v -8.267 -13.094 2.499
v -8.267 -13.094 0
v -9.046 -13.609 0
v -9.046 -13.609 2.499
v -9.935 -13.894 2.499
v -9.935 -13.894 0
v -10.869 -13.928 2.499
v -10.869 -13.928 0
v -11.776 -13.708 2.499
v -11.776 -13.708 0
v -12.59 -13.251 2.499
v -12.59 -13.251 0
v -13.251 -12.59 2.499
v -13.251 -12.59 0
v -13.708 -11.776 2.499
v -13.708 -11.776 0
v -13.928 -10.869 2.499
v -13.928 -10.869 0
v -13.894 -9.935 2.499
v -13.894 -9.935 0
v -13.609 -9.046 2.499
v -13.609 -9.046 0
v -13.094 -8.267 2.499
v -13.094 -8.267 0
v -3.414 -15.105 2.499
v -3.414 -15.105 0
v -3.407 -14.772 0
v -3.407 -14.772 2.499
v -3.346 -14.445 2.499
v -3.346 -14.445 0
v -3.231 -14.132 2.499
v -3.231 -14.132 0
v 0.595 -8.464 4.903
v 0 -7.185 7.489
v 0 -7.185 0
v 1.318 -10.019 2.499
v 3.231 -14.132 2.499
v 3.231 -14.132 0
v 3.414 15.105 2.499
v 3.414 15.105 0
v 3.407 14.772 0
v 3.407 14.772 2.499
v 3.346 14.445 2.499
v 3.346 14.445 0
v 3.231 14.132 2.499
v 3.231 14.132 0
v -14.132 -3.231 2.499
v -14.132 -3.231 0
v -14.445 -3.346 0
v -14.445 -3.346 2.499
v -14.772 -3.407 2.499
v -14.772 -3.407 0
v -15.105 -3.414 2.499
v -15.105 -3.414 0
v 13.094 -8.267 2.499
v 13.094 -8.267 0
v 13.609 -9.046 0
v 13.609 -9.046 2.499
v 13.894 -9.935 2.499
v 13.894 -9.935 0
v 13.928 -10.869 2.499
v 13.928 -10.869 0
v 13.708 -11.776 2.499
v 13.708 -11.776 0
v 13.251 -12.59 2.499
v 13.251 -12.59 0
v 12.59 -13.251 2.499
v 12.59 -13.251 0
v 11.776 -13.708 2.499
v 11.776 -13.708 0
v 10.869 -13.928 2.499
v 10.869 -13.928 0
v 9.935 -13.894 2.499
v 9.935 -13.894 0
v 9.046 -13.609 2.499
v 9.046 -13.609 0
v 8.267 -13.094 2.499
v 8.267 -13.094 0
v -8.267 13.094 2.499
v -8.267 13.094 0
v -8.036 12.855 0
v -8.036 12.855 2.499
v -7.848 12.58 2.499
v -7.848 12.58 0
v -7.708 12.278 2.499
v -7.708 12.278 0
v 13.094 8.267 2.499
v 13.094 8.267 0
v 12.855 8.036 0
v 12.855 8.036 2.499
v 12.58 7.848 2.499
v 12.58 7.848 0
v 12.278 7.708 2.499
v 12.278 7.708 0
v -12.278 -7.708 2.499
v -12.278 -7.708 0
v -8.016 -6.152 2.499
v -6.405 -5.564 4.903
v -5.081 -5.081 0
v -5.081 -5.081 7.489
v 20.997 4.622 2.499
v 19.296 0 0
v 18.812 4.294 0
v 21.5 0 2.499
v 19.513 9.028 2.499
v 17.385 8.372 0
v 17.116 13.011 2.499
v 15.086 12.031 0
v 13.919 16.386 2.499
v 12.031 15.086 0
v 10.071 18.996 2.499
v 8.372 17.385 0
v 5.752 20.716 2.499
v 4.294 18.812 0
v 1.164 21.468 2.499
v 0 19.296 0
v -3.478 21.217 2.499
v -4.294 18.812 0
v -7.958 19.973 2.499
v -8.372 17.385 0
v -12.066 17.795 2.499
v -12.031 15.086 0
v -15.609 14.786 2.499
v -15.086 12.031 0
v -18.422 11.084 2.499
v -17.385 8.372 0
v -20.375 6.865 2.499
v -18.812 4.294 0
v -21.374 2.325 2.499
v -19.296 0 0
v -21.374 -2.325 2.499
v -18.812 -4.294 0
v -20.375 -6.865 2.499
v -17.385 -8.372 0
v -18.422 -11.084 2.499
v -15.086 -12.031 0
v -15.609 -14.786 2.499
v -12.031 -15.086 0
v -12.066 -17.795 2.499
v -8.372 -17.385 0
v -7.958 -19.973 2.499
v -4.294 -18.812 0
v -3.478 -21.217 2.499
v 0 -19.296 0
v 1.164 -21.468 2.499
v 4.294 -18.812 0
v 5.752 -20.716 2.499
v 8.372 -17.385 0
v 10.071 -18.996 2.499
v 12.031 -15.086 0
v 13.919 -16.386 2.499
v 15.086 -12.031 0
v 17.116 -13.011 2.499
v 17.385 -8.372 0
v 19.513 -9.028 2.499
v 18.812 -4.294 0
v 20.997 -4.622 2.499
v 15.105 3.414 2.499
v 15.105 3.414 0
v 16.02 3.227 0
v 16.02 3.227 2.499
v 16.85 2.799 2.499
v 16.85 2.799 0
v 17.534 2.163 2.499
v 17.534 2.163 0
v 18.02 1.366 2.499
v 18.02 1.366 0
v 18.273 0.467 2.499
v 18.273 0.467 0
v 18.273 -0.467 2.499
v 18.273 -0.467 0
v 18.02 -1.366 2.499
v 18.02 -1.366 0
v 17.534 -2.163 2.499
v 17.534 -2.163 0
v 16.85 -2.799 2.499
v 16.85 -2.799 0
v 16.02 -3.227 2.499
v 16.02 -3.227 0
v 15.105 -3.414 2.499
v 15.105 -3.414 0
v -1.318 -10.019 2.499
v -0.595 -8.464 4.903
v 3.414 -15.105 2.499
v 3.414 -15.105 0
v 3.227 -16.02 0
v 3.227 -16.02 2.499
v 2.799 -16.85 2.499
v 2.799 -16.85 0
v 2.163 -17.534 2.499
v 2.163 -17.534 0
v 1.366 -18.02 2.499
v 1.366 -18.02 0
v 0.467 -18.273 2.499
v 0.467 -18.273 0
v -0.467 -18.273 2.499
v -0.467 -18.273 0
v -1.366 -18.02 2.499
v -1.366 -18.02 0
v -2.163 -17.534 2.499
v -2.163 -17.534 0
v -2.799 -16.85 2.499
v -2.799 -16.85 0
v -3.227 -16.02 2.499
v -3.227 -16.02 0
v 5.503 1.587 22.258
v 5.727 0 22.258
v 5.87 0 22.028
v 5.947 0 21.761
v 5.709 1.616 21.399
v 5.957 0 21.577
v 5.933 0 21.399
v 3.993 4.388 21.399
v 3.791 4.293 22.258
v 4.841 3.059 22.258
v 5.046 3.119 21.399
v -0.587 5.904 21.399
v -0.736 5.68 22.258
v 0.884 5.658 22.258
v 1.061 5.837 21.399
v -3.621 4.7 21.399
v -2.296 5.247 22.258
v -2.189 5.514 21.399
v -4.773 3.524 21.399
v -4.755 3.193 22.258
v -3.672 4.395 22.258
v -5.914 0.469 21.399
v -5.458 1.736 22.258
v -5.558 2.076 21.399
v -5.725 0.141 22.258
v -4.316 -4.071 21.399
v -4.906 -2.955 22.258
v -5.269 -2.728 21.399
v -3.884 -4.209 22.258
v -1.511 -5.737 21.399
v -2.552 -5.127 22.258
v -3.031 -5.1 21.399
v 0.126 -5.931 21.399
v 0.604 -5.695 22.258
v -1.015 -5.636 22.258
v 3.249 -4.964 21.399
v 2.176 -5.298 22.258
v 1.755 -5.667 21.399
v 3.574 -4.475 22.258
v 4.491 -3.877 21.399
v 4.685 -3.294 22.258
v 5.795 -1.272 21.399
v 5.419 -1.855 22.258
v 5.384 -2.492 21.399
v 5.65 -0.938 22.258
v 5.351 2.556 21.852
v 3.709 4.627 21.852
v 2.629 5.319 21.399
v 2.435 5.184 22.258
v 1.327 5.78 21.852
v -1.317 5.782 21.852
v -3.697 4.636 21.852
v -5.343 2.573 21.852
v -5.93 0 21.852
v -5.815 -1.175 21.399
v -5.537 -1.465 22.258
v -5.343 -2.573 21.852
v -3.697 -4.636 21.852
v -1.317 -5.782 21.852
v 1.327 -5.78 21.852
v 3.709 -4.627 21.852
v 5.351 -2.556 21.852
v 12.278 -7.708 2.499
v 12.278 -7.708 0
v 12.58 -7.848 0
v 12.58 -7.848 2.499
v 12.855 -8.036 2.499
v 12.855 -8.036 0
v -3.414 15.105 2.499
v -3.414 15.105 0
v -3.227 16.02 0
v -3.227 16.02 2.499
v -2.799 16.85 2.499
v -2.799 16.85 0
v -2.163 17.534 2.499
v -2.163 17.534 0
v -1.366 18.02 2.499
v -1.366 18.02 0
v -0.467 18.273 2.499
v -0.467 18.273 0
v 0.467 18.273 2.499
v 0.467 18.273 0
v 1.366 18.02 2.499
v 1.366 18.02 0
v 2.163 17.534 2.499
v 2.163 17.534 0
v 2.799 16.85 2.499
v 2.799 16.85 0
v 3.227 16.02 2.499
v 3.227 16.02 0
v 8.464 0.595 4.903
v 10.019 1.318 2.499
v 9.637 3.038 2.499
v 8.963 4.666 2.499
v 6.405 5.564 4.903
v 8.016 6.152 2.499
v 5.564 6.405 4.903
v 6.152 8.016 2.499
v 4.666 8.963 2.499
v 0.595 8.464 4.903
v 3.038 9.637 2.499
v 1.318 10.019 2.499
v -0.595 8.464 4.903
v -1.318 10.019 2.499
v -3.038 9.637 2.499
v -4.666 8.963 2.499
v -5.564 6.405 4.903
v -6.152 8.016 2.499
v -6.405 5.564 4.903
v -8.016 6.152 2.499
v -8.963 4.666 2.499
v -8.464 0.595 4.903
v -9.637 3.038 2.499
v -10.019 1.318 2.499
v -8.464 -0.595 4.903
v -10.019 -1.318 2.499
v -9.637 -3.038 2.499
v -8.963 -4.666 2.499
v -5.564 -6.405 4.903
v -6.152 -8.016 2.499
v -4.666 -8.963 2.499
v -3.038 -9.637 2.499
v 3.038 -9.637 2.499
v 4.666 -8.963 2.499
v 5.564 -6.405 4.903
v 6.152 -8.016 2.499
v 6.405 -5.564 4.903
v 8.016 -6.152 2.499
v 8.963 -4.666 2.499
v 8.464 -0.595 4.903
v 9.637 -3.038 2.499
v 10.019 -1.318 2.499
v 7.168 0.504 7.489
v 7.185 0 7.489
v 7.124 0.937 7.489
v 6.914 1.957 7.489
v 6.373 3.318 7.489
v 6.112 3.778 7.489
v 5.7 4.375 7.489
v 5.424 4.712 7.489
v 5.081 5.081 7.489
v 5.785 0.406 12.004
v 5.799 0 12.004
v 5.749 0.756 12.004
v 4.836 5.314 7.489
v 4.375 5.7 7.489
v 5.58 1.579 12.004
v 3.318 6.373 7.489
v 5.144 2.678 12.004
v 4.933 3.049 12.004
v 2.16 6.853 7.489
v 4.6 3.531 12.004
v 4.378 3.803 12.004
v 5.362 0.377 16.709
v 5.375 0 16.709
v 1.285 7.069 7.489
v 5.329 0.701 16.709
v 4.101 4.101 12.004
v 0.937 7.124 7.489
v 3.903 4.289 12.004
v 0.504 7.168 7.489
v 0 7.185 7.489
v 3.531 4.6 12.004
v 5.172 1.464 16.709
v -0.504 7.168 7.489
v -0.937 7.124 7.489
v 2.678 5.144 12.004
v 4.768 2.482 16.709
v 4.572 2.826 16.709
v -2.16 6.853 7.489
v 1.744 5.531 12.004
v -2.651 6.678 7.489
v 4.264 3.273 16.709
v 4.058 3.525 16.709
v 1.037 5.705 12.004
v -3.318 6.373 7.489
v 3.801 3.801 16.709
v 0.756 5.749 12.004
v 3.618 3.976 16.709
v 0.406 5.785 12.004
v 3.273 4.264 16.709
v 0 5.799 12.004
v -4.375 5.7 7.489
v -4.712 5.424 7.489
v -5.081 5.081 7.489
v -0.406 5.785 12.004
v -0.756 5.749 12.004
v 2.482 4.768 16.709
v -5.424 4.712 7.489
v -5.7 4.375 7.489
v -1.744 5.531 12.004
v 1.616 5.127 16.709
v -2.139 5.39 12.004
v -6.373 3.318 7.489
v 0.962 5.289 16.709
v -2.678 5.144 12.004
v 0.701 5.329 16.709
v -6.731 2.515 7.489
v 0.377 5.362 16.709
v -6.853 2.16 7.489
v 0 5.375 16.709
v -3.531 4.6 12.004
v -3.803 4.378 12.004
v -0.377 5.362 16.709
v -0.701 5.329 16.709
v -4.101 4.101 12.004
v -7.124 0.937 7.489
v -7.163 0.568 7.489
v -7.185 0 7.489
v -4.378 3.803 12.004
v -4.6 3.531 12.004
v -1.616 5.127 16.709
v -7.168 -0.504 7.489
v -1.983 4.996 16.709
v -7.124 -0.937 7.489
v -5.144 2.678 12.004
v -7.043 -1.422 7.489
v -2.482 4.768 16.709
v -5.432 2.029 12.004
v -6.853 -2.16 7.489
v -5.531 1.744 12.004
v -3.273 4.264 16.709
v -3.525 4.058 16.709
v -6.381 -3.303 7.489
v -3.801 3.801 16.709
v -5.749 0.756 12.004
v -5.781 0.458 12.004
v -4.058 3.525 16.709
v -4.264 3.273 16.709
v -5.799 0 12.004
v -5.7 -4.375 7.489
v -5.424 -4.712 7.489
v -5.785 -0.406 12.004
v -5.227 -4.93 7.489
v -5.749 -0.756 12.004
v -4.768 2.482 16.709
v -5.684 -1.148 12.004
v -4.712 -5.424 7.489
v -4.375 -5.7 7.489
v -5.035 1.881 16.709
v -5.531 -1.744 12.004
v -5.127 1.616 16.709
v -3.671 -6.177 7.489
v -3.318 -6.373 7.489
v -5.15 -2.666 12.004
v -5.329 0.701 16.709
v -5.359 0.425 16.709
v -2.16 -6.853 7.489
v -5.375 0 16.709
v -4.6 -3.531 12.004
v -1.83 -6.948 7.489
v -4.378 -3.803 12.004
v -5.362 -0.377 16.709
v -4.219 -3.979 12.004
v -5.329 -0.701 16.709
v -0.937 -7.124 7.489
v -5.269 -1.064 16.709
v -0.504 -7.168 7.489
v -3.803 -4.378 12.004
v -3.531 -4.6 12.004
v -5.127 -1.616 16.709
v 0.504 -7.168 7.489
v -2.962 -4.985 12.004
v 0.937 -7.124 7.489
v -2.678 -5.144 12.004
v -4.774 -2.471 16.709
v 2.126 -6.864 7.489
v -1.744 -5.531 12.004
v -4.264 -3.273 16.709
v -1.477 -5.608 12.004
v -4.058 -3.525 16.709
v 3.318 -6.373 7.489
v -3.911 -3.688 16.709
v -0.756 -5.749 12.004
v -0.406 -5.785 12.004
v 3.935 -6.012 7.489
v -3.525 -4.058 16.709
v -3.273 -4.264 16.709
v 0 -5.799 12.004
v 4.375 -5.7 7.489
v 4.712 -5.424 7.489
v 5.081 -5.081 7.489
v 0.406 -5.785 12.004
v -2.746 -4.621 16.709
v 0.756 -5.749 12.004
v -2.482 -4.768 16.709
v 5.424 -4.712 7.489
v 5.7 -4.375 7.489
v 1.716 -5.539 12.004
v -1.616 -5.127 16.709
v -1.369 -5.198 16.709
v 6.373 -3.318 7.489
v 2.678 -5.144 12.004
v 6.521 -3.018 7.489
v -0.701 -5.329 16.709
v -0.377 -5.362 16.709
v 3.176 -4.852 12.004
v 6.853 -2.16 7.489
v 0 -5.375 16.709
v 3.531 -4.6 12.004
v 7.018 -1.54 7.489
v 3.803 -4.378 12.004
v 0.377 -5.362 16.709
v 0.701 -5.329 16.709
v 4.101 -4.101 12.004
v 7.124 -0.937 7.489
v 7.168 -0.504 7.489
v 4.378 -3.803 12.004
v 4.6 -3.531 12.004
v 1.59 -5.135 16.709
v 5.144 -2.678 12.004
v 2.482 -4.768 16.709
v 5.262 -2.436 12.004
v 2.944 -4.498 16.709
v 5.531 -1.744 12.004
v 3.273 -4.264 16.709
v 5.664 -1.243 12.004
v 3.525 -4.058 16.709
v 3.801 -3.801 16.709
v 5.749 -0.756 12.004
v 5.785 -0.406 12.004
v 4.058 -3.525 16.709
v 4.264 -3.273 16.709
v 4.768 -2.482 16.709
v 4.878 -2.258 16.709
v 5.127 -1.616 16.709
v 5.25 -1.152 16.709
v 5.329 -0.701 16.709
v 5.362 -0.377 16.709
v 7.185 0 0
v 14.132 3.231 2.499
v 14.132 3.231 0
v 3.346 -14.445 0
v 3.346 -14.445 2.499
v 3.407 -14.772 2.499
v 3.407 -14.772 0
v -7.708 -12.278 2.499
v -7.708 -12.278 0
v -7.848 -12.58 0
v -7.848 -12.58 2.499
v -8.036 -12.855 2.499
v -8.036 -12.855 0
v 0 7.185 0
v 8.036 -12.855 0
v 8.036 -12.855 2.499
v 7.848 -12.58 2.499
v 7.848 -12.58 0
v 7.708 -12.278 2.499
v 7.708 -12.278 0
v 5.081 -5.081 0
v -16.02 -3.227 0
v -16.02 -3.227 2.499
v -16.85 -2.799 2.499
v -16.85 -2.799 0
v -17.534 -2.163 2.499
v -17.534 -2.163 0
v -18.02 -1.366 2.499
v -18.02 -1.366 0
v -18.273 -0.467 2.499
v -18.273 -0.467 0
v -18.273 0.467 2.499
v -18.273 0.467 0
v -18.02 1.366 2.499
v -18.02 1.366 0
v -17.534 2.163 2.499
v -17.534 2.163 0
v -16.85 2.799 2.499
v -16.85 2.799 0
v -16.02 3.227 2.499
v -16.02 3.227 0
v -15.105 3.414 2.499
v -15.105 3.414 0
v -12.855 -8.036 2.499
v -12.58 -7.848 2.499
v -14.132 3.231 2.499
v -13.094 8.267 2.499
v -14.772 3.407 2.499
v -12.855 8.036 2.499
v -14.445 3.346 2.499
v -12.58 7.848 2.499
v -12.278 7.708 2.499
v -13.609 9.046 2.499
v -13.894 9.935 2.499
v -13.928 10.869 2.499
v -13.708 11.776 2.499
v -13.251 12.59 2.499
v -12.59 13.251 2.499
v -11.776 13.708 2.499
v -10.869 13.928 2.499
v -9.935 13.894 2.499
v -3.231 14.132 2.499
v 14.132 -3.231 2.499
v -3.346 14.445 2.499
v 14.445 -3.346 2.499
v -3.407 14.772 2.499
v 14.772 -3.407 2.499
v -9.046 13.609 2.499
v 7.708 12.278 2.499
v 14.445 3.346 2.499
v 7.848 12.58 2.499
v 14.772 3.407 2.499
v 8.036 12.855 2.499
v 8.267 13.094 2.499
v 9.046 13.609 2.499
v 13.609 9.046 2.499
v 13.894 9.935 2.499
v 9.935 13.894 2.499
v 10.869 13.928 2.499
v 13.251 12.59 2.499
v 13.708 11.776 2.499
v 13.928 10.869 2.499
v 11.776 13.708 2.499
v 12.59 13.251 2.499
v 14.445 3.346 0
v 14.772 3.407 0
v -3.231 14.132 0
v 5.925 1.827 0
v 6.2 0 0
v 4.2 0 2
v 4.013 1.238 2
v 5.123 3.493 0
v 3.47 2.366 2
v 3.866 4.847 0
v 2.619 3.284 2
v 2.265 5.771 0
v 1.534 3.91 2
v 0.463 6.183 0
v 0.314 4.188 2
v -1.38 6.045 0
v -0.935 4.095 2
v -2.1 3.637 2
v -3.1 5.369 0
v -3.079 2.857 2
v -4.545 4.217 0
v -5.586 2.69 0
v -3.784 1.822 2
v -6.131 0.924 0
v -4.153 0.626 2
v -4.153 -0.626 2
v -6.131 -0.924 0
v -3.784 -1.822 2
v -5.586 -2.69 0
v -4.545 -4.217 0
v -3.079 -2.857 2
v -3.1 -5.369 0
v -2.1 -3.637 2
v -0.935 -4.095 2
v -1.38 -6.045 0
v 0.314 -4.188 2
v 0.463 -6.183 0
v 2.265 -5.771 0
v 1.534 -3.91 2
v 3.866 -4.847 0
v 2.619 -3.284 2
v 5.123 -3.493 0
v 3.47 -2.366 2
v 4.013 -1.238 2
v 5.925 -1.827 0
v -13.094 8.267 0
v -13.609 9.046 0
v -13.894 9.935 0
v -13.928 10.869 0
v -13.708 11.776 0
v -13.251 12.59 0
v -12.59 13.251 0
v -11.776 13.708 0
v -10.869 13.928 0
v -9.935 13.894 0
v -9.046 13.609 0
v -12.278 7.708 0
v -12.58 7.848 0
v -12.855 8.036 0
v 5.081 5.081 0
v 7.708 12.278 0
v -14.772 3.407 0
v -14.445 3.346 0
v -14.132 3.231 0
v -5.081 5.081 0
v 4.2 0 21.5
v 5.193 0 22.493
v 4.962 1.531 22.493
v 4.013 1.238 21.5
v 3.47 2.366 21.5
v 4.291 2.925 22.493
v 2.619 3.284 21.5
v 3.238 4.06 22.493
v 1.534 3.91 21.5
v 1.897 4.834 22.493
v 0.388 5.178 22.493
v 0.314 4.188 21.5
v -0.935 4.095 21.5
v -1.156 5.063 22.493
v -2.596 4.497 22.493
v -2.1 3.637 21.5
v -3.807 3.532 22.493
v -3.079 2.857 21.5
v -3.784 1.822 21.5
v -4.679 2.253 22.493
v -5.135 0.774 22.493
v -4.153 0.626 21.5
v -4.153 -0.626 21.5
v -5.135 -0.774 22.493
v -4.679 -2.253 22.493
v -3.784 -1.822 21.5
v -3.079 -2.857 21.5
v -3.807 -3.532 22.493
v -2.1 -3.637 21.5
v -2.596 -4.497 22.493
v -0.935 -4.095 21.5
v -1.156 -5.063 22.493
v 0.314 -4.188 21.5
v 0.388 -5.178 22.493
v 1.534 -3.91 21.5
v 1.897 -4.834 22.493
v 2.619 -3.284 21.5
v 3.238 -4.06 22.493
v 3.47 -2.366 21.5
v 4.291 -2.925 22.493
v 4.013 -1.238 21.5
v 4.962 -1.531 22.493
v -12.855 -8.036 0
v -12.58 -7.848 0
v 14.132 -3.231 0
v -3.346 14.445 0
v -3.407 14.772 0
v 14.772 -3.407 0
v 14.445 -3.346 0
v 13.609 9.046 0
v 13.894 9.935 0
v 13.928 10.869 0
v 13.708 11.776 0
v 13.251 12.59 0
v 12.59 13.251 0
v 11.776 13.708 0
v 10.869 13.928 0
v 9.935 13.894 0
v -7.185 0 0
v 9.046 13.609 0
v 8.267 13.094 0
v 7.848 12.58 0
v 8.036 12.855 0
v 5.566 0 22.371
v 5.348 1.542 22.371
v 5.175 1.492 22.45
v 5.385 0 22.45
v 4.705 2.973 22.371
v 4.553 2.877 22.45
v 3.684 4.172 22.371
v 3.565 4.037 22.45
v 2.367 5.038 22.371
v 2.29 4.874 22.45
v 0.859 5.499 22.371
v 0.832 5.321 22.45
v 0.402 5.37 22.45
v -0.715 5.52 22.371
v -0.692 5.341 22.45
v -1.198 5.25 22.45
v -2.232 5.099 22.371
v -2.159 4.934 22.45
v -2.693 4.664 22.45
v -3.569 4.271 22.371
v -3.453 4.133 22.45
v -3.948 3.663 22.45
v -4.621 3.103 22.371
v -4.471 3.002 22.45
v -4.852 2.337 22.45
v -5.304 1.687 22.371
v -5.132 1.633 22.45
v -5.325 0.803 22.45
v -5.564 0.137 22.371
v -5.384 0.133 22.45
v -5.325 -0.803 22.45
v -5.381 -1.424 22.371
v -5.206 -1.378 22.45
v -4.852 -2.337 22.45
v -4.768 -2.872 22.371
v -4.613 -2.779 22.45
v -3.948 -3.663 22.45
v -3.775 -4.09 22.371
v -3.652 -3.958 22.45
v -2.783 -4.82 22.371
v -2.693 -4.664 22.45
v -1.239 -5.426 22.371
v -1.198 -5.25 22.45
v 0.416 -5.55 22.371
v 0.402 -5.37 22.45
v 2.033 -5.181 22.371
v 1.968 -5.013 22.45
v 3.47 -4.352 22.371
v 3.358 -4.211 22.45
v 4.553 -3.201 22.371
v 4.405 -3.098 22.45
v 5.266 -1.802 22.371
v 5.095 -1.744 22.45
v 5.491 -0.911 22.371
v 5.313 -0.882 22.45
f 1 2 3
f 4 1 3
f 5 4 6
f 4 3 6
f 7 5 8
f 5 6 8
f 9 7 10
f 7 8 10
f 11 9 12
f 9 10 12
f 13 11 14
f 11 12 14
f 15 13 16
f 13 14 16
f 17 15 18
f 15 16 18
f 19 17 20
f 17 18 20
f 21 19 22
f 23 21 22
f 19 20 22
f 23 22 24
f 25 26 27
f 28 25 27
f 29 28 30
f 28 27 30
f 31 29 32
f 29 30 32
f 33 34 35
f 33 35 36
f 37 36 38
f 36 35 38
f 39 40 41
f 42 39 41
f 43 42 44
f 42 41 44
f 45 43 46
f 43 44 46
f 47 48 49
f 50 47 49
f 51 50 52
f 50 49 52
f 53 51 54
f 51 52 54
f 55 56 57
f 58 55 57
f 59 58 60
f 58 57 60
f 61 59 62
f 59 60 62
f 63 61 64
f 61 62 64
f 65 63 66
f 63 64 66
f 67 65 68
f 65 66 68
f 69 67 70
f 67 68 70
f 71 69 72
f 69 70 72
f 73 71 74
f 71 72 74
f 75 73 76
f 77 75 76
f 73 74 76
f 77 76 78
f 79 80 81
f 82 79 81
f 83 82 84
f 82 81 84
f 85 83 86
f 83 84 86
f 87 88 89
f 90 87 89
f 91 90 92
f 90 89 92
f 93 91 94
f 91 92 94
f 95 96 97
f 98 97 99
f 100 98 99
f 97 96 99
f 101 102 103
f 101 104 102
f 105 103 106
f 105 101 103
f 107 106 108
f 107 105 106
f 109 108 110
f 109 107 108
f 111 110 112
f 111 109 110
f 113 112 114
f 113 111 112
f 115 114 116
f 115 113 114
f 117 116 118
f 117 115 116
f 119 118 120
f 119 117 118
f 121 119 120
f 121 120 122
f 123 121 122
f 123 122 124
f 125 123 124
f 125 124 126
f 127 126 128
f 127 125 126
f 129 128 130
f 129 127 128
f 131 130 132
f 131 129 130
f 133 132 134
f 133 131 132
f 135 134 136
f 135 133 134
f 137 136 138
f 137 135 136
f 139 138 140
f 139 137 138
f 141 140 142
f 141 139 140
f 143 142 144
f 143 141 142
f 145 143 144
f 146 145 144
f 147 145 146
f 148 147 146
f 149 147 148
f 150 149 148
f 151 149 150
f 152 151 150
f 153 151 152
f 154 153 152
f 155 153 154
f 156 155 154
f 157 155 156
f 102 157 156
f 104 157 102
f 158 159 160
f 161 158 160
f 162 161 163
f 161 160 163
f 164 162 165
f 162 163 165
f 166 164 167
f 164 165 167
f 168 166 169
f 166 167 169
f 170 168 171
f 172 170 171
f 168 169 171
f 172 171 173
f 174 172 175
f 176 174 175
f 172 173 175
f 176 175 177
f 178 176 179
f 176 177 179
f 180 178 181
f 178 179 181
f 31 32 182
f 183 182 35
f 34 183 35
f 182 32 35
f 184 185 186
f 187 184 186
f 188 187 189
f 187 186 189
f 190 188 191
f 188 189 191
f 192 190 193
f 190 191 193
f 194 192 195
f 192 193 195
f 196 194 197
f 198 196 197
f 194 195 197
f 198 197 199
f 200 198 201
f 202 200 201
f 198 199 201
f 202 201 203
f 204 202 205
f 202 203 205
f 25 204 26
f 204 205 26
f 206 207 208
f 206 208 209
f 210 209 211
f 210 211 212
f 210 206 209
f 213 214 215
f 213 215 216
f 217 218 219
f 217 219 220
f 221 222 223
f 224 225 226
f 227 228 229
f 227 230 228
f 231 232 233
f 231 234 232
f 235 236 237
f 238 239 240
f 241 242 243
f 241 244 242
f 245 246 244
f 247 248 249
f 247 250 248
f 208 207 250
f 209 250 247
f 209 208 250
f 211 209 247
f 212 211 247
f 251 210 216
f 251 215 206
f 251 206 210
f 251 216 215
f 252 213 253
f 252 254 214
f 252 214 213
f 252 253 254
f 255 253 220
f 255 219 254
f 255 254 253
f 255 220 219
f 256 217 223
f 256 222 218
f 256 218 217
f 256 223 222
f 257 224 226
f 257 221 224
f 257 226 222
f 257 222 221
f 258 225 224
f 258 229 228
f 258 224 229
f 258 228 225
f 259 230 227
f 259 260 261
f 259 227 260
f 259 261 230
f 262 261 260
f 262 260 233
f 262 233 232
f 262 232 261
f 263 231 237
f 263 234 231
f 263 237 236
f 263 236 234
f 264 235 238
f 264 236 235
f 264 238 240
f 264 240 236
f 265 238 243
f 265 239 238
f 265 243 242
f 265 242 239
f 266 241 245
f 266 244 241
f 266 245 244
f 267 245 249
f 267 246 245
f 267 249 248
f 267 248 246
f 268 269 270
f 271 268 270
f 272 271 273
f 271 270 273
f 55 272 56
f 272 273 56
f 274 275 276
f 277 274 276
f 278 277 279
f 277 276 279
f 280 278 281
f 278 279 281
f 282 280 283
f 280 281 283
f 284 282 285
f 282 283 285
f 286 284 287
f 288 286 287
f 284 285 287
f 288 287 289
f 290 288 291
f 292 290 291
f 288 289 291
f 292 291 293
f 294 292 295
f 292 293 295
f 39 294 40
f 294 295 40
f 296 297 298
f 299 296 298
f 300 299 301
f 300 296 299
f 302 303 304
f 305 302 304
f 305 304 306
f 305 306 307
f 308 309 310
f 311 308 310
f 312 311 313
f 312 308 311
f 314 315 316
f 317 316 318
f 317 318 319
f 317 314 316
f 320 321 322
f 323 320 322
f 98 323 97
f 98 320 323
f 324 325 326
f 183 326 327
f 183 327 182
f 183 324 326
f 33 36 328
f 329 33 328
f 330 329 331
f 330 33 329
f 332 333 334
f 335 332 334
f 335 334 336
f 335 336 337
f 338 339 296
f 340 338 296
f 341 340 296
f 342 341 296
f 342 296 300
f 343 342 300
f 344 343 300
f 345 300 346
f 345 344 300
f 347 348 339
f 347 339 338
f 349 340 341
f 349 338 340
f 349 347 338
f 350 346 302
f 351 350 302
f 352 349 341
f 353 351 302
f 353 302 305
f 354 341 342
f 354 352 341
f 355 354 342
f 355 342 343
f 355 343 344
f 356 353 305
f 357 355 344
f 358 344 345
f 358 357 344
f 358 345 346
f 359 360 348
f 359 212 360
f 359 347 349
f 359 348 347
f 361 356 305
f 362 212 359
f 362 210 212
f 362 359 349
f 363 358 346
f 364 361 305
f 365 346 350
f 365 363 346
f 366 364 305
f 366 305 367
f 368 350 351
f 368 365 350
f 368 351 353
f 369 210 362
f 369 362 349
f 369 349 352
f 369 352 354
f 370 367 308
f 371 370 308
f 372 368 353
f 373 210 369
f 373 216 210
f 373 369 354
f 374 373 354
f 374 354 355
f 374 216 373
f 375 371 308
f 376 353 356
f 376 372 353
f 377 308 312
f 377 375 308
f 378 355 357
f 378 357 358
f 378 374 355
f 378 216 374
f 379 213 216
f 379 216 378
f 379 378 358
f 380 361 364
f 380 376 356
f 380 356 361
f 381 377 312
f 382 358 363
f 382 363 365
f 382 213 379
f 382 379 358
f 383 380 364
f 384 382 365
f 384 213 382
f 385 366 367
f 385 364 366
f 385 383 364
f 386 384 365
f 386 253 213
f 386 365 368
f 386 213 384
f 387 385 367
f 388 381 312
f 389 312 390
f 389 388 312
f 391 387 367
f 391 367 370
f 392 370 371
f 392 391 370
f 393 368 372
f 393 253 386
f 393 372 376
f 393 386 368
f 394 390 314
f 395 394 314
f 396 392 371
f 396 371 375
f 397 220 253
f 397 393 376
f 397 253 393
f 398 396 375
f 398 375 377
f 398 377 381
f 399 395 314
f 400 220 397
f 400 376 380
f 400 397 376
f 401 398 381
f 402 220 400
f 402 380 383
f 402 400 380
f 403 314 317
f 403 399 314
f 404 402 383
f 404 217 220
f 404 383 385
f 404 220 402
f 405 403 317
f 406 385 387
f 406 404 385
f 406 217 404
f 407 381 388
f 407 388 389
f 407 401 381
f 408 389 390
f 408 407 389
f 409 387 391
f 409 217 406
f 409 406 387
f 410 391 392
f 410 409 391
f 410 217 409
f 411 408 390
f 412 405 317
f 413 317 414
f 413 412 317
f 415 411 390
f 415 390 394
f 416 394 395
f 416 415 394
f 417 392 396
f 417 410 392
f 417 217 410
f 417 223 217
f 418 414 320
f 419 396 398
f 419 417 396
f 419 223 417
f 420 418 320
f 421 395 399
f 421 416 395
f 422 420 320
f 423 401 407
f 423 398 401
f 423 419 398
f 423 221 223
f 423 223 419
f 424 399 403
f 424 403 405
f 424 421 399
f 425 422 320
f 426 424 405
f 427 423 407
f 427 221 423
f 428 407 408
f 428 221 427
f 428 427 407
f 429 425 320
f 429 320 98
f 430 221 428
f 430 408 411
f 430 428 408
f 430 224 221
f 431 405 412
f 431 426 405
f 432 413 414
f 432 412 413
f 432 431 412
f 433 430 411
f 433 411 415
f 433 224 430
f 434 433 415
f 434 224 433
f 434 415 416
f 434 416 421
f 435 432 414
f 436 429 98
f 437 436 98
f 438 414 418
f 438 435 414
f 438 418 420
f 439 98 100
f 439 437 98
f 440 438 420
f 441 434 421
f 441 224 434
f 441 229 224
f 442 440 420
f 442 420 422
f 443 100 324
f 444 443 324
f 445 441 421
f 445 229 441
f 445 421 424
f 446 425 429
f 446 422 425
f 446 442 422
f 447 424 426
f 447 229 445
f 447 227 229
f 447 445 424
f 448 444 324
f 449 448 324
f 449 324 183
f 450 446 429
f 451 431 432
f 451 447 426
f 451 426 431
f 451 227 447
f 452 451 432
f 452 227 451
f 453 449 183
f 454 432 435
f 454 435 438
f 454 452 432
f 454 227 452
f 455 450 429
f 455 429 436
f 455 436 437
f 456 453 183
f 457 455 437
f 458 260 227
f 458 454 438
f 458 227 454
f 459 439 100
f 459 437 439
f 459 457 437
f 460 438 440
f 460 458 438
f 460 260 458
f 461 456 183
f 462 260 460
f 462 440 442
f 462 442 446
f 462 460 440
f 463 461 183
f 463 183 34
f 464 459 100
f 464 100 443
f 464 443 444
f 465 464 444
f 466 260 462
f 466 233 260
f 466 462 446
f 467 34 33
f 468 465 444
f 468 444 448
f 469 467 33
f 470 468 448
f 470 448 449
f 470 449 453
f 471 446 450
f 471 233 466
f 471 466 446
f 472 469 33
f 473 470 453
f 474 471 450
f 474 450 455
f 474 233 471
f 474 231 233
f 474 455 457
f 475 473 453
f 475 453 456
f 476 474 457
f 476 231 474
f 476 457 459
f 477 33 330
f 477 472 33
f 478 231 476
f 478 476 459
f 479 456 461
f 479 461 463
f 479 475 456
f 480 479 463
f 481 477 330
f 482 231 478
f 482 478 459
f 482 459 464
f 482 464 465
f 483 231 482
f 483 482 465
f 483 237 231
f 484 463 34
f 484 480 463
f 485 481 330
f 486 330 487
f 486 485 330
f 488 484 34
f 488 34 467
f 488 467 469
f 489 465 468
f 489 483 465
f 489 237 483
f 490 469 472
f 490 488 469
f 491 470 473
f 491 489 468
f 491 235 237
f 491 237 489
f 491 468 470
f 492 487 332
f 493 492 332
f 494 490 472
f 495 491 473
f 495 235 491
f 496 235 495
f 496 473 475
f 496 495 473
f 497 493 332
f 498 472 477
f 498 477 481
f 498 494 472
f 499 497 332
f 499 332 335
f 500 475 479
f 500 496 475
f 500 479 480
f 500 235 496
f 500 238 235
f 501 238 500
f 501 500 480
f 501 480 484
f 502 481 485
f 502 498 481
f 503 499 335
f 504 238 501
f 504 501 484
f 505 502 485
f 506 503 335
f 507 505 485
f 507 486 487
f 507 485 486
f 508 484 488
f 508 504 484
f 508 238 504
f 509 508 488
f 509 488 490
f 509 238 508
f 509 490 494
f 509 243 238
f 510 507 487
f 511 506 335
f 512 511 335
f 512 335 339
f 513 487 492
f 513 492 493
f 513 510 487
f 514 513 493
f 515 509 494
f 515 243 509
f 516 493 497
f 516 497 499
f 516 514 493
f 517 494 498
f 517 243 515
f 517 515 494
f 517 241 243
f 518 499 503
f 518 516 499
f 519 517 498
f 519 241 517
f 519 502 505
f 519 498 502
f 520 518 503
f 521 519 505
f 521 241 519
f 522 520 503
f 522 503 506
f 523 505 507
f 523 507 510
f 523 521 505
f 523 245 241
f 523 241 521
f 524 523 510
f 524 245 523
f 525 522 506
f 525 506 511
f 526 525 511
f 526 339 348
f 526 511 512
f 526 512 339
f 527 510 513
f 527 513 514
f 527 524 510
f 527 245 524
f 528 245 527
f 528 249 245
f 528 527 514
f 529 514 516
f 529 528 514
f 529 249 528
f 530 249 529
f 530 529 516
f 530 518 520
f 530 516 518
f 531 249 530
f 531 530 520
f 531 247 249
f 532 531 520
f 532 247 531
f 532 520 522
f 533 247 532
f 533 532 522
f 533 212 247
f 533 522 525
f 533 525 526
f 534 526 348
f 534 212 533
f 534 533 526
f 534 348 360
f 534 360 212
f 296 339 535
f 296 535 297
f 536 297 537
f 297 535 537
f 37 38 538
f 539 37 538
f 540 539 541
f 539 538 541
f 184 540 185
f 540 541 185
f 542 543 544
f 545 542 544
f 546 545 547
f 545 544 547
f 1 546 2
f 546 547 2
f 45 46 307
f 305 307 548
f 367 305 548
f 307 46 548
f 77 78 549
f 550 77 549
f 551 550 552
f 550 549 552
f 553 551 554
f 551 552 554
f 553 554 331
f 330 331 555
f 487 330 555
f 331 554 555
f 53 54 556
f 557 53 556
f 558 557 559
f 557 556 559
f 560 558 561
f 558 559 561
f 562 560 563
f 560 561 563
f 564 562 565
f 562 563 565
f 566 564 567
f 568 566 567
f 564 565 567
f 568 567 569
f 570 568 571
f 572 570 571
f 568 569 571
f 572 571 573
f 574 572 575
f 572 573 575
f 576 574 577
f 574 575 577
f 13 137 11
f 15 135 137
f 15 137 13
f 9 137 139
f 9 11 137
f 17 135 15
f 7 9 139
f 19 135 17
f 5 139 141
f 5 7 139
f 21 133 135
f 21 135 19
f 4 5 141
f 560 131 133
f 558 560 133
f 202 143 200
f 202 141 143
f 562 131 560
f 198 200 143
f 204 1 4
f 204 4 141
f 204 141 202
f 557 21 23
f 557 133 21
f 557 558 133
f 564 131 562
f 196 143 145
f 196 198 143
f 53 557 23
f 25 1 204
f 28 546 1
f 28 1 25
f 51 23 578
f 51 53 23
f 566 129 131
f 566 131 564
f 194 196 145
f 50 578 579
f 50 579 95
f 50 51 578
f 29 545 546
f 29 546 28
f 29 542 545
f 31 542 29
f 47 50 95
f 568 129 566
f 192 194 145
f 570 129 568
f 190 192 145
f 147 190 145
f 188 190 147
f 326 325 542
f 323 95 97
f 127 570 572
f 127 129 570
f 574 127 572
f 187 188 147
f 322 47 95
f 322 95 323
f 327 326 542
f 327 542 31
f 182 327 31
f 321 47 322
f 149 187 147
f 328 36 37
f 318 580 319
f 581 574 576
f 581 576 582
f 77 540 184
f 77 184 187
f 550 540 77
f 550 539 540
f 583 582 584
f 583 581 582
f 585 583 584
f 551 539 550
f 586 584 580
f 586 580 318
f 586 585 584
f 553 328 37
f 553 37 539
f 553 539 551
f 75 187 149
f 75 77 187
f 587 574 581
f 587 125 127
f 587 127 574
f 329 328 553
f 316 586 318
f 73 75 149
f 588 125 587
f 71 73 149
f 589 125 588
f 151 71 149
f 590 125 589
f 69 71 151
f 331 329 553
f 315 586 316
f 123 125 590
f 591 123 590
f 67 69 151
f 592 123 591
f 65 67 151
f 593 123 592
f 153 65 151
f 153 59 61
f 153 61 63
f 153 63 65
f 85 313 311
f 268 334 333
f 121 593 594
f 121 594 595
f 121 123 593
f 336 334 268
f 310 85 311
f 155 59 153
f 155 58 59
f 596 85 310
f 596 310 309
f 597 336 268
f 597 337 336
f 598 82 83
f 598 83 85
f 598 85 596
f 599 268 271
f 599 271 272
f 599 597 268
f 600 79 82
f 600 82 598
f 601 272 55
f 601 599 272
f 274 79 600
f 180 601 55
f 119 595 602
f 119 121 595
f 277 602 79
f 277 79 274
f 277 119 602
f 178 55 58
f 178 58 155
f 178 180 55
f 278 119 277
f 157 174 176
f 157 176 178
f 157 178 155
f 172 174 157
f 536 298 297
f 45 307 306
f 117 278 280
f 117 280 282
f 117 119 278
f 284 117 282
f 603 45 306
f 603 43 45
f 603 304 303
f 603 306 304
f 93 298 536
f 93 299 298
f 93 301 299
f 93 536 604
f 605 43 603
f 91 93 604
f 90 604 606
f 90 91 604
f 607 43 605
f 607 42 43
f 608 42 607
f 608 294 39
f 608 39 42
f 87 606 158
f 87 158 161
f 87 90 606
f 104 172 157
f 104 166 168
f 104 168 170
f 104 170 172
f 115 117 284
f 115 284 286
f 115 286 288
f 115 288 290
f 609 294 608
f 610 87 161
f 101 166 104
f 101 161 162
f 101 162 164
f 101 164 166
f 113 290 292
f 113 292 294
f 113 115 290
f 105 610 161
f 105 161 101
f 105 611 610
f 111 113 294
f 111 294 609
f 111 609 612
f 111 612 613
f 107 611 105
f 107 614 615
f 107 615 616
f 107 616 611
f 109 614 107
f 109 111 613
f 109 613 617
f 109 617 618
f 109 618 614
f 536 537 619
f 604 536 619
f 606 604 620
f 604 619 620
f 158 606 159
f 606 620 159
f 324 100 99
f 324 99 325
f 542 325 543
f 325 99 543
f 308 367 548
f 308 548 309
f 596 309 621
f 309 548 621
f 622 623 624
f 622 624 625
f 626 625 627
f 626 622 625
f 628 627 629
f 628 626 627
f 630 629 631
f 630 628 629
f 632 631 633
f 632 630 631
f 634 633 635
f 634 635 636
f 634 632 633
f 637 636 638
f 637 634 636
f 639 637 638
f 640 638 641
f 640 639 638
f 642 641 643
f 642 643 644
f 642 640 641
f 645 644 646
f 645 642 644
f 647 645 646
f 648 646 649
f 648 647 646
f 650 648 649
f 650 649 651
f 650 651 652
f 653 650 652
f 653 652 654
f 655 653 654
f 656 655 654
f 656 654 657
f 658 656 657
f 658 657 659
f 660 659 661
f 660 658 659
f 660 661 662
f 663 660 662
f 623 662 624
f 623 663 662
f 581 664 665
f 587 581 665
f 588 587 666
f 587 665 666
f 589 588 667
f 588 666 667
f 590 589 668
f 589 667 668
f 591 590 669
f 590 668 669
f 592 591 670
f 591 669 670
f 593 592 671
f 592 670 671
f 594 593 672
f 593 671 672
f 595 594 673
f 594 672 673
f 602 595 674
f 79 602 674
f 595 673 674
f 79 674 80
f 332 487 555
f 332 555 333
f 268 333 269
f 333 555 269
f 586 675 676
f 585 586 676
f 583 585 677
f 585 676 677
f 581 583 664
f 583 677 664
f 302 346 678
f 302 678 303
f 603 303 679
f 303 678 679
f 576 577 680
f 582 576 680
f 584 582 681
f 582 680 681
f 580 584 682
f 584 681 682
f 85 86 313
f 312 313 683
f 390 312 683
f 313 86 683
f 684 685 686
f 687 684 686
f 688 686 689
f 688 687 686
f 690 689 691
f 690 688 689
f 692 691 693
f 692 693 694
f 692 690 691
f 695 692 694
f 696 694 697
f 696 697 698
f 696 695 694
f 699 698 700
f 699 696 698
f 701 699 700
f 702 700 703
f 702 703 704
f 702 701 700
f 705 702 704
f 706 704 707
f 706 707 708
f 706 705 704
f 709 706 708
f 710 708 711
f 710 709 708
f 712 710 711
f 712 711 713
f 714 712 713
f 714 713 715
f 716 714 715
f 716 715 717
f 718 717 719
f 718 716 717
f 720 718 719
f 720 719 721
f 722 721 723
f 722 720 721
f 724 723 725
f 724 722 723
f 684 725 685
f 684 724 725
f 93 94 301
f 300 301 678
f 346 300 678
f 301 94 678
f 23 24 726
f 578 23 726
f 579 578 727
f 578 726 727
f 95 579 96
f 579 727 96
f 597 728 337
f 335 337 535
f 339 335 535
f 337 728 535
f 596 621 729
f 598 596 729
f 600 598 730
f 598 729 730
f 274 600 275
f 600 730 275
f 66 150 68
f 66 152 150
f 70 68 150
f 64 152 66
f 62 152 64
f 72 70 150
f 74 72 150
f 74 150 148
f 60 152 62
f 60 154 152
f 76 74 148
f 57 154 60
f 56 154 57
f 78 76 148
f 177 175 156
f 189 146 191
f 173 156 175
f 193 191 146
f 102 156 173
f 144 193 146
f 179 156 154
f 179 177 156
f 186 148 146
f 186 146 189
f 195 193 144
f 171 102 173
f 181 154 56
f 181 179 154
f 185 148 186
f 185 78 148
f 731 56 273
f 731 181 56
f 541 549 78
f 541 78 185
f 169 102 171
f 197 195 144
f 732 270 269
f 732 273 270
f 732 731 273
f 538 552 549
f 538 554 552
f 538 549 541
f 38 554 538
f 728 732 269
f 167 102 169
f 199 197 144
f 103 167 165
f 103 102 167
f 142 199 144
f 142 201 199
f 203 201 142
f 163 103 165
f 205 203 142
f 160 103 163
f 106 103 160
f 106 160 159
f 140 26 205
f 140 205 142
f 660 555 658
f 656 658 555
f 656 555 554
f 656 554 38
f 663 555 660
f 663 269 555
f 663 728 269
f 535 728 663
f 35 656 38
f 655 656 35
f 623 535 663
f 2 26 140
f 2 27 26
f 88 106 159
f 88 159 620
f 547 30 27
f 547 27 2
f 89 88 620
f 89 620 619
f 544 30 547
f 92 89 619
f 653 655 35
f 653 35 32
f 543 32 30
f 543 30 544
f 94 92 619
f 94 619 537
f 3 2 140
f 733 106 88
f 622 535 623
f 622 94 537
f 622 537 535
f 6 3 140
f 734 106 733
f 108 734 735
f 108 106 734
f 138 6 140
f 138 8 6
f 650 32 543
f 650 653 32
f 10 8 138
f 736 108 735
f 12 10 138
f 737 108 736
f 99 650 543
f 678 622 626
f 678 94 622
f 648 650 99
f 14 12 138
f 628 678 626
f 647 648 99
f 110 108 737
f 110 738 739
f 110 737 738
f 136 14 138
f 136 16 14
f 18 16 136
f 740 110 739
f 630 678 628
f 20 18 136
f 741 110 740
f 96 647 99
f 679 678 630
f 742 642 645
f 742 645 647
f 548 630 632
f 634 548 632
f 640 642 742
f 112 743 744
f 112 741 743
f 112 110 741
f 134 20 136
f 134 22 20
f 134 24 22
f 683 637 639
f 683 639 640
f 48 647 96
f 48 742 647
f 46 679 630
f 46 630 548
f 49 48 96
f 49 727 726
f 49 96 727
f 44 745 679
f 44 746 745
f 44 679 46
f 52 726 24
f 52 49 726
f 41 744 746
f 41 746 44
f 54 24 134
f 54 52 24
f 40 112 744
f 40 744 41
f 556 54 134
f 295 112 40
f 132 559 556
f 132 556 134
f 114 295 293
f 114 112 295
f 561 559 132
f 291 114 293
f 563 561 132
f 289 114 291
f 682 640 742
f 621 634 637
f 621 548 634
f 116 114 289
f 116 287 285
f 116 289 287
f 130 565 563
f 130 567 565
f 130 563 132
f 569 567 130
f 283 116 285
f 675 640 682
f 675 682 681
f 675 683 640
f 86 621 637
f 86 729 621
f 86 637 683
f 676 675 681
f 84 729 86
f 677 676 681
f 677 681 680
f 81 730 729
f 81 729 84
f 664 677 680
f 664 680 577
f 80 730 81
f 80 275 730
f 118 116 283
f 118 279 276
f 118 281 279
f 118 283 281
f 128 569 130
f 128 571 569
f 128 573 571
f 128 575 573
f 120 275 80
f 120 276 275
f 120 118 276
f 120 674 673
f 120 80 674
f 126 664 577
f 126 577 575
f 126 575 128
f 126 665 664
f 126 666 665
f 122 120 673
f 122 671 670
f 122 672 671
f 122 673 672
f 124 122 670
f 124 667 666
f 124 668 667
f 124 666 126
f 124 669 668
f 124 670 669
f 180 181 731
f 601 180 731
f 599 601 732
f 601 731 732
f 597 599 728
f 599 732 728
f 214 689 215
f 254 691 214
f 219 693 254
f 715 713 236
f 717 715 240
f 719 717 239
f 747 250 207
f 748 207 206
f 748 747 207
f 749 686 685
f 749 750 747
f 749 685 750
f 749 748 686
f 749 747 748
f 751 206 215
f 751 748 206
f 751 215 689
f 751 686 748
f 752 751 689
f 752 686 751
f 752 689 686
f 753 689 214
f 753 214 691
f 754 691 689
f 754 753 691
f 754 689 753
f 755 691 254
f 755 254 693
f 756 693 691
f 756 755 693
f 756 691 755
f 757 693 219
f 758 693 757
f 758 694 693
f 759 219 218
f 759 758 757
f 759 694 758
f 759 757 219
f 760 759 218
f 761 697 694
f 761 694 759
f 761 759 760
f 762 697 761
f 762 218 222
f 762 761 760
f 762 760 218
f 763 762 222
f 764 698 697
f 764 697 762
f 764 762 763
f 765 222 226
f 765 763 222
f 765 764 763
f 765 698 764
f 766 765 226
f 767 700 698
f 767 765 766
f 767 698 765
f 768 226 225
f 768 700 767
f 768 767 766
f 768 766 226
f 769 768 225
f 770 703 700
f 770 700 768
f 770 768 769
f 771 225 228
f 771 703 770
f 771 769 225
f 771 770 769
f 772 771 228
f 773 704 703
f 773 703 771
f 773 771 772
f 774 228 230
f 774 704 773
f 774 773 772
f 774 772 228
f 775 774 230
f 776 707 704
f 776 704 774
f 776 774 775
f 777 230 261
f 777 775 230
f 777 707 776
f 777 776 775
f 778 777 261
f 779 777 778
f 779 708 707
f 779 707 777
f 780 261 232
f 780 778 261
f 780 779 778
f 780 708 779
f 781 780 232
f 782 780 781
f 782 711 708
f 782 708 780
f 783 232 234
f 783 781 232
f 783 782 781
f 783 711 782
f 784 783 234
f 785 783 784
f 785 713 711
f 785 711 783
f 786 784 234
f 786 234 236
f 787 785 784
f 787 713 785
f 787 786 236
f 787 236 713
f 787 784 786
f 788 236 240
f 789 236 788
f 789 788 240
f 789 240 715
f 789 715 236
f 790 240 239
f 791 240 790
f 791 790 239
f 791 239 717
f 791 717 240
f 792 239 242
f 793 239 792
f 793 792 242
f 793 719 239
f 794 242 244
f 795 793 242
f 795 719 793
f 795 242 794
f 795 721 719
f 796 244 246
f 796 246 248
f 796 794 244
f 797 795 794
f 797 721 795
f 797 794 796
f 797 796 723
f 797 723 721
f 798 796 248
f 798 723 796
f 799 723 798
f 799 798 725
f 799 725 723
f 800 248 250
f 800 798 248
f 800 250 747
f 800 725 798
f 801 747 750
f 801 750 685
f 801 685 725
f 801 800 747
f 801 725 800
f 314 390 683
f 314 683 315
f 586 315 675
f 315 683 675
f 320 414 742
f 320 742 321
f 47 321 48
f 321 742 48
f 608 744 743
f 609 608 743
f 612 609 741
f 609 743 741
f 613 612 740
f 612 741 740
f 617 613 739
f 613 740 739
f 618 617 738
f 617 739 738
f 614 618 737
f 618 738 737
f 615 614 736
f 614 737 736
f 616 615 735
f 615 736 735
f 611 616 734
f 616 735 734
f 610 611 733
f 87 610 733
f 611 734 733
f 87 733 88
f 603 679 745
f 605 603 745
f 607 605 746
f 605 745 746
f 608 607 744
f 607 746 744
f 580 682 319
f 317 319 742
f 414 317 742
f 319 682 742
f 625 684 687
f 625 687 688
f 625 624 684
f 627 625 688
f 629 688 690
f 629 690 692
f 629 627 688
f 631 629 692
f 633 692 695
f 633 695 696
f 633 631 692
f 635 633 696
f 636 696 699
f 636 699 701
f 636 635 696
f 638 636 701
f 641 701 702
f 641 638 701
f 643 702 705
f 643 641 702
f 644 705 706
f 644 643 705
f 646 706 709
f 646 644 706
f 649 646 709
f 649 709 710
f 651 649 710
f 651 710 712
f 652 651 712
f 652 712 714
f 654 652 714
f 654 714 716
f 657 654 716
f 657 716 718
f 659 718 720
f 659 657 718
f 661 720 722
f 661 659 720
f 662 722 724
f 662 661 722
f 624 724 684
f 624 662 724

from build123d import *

# Parameters (mm, degrees)
F2_SIZE  = 2
F4_DEPTH = 25
F5_R     = 1


# Not quite as in the source:
# - a fillet or chamfer that OpenCascade refuses, or shapes differently, is made with other operations: its cross-section is extruded or revolved along the edge and cut away or added


with BuildPart() as f1:
    # F0 (on Front) → F1 (revolve)
    with BuildSketch(Plane.XZ):
        with BuildLine():
            Line((4.2, 22.5), (4.2, 0))
            Line((4.2, 0), (19.2955706467, 0))
            Line((19.2955706467, 0), (21.5, 2.499420478))
            Line((21.5, 2.499420478), (20.5, 2.499420478))
            Line((20.5, 2.499420478), (10.1050306112, 2.499420478))
            ThreePointArc((10.1050306112, 2.499420478), (5.8563757844, 11.7216769606), (6.0455347411, 21.8737851828))
            Line((6.0455347411, 21.8737851828), (5.5262264796, 22.5))
            Line((5.5262264796, 22.5), (4.2, 22.5))
        make_face()
    revolve(axis=Axis((0, 0, 11.7304213345), (0, 0, 1)))

    # F2
    f2_edges = [f1.edges().sort_by_distance(p)[0] for p in [
        (-4.2, 0, 0),
    ]]
    chamfer(f2_edges, length=F2_SIZE)

    # F3 (on face) → F4 (cut)
    with BuildSketch(Plane(origin=(0, 0, 0), x_dir=(1, 0, 0), z_dir=(0, 0, -1))):
        with BuildLine():
            ThreePointArc((14.132025682, -3.23120262), (14.6068235272, -3.3834984393), (15.104538526, -3.4136113971))
            ThreePointArc((15.104538526, -3.4136113971), (18.3046103696, 0), (15.104538526, 3.4136113971))
            ThreePointArc((15.104538526, 3.4136113971), (14.6068235272, 3.3834984393), (14.132025682, 3.23120262))
            Line((14.132025682, 3.23120262), (7.1852975525, 0))
            Line((7.1852975525, 0), (14.132025682, -3.23120262))
        make_face()
        with BuildLine():
            ThreePointArc((12.2776564756, 7.7080459076), (12.7210786582, 7.9360892771), (13.0943093857, 8.2667338512))
            ThreePointArc((13.0943093857, 8.2667338512), (12.9433141193, 12.9433141193), (8.2667338512, 13.0943093857))
            ThreePointArc((8.2667338512, 13.0943093857), (7.9360892771, 12.7210786582), (7.7080459076, 12.2776564756))
            Line((7.7080459076, 12.2776564756), (5.0807726242, 5.0807726242))
            Line((5.0807726242, 5.0807726242), (12.2776564756, 7.7080459076))
        make_face()
        with BuildLine():
            ThreePointArc((3.23120262, 14.132025682), (3.3834984393, 14.6068235272), (3.4136113971, 15.104538526))
            ThreePointArc((3.4136113971, 15.104538526), (0, 18.3046103696), (-3.4136113971, 15.104538526))
            ThreePointArc((-3.4136113971, 15.104538526), (-3.3834984393, 14.6068235272), (-3.23120262, 14.132025682))
            Line((-3.23120262, 14.132025682), (0, 7.1852975525))
            Line((0, 7.1852975525), (3.23120262, 14.132025682))
        make_face()
        with BuildLine():
            ThreePointArc((-7.7080459076, 12.2776564756), (-7.9360892771, 12.7210786582), (-8.2667338512, 13.0943093857))
            ThreePointArc((-8.2667338512, 13.0943093857), (-12.9433141193, 12.9433141193), (-13.0943093857, 8.2667338512))
            ThreePointArc((-13.0943093857, 8.2667338512), (-12.7210786582, 7.9360892771), (-12.2776564756, 7.7080459076))
            Line((-12.2776564756, 7.7080459076), (-5.0807726242, 5.0807726242))
            Line((-5.0807726242, 5.0807726242), (-7.7080459076, 12.2776564756))
        make_face()
        with BuildLine():
            ThreePointArc((-14.132025682, 3.23120262), (-14.6068235272, 3.3834984393), (-15.104538526, 3.4136113971))
            ThreePointArc((-15.104538526, 3.4136113971), (-18.3046103696, 0), (-15.104538526, -3.4136113971))
            ThreePointArc((-15.104538526, -3.4136113971), (-14.6068235272, -3.3834984393), (-14.132025682, -3.23120262))
            Line((-14.132025682, -3.23120262), (-7.1852975525, 0))
            Line((-7.1852975525, 0), (-14.132025682, 3.23120262))
        make_face()
        with BuildLine():
            ThreePointArc((-12.2776564756, -7.7080459076), (-12.7210786582, -7.9360892771), (-13.0943093857, -8.2667338512))
            ThreePointArc((-13.0943093857, -8.2667338512), (-12.9433141193, -12.9433141193), (-8.2667338512, -13.0943093857))
            ThreePointArc((-8.2667338512, -13.0943093857), (-7.9360892771, -12.7210786582), (-7.7080459076, -12.2776564756))
            Line((-7.7080459076, -12.2776564756), (-5.0807726242, -5.0807726242))
            Line((-5.0807726242, -5.0807726242), (-12.2776564756, -7.7080459076))
        make_face()
        with BuildLine():
            ThreePointArc((-3.23120262, -14.132025682), (-3.3834984393, -14.6068235272), (-3.4136113971, -15.104538526))
            ThreePointArc((-3.4136113971, -15.104538526), (0, -18.3046103696), (3.4136113971, -15.104538526))
            ThreePointArc((3.4136113971, -15.104538526), (3.3834984393, -14.6068235272), (3.23120262, -14.132025682))
            Line((3.23120262, -14.132025682), (0, -7.1852975525))
            Line((0, -7.1852975525), (-3.23120262, -14.132025682))
        make_face()
        with BuildLine():
            ThreePointArc((7.7080459076, -12.2776564756), (7.9360892771, -12.7210786582), (8.2667338512, -13.0943093857))
            ThreePointArc((8.2667338512, -13.0943093857), (12.9433141193, -12.9433141193), (13.0943093857, -8.2667338512))
            ThreePointArc((13.0943093857, -8.2667338512), (12.7210786582, -7.9360892771), (12.2776564756, -7.7080459076))
            Line((12.2776564756, -7.7080459076), (5.0807726242, -5.0807726242))
            Line((5.0807726242, -5.0807726242), (7.7080459076, -12.2776564756))
        make_face()
    extrude(amount=-F4_DEPTH, mode=Mode.SUBTRACT)

    # F5
    f5_edges = [f1.edges().sort_by_distance(p)[0] for p in [
        (-6.045535, 0, 21.873785),
    ]]
    fillet(f5_edges, radius=F5_R)

    # F6: fillet of radius 1 on 1 edges, made by hand

    # F6_s1 → F6_t2 (revolve, cut)
    with BuildSketch(Plane.XZ):
        with BuildLine():
            ThreePointArc((5.7271677505, 22.2576998048), (5.4226307234, 22.4374699475), (5.0745644975, 22.5))
            Line((5.0745644975, 22.5), (5.5262264796, 22.5))
            ThreePointArc((5.5262264796, 22.5), (5.6266952661, 22.3788483691), (5.7271677505, 22.2576998048))
        make_face()
    revolve(axis=Axis((0, 0, 22.5), (0, 0, 1)), mode=Mode.SUBTRACT)

    # F7: chamfer of 1 on 1 edges, made by hand

    # F7_s1 → F7_t2 (revolve, cut)
    with BuildSketch(Plane.XZ):
        Polygon((5.2, 22.5), (4.2, 21.5), (4.2, 22.5), align=None)
    revolve(axis=Axis((0, 0, 22.5), (0, 0, 1)), mode=Mode.SUBTRACT)


solid = f1.part
